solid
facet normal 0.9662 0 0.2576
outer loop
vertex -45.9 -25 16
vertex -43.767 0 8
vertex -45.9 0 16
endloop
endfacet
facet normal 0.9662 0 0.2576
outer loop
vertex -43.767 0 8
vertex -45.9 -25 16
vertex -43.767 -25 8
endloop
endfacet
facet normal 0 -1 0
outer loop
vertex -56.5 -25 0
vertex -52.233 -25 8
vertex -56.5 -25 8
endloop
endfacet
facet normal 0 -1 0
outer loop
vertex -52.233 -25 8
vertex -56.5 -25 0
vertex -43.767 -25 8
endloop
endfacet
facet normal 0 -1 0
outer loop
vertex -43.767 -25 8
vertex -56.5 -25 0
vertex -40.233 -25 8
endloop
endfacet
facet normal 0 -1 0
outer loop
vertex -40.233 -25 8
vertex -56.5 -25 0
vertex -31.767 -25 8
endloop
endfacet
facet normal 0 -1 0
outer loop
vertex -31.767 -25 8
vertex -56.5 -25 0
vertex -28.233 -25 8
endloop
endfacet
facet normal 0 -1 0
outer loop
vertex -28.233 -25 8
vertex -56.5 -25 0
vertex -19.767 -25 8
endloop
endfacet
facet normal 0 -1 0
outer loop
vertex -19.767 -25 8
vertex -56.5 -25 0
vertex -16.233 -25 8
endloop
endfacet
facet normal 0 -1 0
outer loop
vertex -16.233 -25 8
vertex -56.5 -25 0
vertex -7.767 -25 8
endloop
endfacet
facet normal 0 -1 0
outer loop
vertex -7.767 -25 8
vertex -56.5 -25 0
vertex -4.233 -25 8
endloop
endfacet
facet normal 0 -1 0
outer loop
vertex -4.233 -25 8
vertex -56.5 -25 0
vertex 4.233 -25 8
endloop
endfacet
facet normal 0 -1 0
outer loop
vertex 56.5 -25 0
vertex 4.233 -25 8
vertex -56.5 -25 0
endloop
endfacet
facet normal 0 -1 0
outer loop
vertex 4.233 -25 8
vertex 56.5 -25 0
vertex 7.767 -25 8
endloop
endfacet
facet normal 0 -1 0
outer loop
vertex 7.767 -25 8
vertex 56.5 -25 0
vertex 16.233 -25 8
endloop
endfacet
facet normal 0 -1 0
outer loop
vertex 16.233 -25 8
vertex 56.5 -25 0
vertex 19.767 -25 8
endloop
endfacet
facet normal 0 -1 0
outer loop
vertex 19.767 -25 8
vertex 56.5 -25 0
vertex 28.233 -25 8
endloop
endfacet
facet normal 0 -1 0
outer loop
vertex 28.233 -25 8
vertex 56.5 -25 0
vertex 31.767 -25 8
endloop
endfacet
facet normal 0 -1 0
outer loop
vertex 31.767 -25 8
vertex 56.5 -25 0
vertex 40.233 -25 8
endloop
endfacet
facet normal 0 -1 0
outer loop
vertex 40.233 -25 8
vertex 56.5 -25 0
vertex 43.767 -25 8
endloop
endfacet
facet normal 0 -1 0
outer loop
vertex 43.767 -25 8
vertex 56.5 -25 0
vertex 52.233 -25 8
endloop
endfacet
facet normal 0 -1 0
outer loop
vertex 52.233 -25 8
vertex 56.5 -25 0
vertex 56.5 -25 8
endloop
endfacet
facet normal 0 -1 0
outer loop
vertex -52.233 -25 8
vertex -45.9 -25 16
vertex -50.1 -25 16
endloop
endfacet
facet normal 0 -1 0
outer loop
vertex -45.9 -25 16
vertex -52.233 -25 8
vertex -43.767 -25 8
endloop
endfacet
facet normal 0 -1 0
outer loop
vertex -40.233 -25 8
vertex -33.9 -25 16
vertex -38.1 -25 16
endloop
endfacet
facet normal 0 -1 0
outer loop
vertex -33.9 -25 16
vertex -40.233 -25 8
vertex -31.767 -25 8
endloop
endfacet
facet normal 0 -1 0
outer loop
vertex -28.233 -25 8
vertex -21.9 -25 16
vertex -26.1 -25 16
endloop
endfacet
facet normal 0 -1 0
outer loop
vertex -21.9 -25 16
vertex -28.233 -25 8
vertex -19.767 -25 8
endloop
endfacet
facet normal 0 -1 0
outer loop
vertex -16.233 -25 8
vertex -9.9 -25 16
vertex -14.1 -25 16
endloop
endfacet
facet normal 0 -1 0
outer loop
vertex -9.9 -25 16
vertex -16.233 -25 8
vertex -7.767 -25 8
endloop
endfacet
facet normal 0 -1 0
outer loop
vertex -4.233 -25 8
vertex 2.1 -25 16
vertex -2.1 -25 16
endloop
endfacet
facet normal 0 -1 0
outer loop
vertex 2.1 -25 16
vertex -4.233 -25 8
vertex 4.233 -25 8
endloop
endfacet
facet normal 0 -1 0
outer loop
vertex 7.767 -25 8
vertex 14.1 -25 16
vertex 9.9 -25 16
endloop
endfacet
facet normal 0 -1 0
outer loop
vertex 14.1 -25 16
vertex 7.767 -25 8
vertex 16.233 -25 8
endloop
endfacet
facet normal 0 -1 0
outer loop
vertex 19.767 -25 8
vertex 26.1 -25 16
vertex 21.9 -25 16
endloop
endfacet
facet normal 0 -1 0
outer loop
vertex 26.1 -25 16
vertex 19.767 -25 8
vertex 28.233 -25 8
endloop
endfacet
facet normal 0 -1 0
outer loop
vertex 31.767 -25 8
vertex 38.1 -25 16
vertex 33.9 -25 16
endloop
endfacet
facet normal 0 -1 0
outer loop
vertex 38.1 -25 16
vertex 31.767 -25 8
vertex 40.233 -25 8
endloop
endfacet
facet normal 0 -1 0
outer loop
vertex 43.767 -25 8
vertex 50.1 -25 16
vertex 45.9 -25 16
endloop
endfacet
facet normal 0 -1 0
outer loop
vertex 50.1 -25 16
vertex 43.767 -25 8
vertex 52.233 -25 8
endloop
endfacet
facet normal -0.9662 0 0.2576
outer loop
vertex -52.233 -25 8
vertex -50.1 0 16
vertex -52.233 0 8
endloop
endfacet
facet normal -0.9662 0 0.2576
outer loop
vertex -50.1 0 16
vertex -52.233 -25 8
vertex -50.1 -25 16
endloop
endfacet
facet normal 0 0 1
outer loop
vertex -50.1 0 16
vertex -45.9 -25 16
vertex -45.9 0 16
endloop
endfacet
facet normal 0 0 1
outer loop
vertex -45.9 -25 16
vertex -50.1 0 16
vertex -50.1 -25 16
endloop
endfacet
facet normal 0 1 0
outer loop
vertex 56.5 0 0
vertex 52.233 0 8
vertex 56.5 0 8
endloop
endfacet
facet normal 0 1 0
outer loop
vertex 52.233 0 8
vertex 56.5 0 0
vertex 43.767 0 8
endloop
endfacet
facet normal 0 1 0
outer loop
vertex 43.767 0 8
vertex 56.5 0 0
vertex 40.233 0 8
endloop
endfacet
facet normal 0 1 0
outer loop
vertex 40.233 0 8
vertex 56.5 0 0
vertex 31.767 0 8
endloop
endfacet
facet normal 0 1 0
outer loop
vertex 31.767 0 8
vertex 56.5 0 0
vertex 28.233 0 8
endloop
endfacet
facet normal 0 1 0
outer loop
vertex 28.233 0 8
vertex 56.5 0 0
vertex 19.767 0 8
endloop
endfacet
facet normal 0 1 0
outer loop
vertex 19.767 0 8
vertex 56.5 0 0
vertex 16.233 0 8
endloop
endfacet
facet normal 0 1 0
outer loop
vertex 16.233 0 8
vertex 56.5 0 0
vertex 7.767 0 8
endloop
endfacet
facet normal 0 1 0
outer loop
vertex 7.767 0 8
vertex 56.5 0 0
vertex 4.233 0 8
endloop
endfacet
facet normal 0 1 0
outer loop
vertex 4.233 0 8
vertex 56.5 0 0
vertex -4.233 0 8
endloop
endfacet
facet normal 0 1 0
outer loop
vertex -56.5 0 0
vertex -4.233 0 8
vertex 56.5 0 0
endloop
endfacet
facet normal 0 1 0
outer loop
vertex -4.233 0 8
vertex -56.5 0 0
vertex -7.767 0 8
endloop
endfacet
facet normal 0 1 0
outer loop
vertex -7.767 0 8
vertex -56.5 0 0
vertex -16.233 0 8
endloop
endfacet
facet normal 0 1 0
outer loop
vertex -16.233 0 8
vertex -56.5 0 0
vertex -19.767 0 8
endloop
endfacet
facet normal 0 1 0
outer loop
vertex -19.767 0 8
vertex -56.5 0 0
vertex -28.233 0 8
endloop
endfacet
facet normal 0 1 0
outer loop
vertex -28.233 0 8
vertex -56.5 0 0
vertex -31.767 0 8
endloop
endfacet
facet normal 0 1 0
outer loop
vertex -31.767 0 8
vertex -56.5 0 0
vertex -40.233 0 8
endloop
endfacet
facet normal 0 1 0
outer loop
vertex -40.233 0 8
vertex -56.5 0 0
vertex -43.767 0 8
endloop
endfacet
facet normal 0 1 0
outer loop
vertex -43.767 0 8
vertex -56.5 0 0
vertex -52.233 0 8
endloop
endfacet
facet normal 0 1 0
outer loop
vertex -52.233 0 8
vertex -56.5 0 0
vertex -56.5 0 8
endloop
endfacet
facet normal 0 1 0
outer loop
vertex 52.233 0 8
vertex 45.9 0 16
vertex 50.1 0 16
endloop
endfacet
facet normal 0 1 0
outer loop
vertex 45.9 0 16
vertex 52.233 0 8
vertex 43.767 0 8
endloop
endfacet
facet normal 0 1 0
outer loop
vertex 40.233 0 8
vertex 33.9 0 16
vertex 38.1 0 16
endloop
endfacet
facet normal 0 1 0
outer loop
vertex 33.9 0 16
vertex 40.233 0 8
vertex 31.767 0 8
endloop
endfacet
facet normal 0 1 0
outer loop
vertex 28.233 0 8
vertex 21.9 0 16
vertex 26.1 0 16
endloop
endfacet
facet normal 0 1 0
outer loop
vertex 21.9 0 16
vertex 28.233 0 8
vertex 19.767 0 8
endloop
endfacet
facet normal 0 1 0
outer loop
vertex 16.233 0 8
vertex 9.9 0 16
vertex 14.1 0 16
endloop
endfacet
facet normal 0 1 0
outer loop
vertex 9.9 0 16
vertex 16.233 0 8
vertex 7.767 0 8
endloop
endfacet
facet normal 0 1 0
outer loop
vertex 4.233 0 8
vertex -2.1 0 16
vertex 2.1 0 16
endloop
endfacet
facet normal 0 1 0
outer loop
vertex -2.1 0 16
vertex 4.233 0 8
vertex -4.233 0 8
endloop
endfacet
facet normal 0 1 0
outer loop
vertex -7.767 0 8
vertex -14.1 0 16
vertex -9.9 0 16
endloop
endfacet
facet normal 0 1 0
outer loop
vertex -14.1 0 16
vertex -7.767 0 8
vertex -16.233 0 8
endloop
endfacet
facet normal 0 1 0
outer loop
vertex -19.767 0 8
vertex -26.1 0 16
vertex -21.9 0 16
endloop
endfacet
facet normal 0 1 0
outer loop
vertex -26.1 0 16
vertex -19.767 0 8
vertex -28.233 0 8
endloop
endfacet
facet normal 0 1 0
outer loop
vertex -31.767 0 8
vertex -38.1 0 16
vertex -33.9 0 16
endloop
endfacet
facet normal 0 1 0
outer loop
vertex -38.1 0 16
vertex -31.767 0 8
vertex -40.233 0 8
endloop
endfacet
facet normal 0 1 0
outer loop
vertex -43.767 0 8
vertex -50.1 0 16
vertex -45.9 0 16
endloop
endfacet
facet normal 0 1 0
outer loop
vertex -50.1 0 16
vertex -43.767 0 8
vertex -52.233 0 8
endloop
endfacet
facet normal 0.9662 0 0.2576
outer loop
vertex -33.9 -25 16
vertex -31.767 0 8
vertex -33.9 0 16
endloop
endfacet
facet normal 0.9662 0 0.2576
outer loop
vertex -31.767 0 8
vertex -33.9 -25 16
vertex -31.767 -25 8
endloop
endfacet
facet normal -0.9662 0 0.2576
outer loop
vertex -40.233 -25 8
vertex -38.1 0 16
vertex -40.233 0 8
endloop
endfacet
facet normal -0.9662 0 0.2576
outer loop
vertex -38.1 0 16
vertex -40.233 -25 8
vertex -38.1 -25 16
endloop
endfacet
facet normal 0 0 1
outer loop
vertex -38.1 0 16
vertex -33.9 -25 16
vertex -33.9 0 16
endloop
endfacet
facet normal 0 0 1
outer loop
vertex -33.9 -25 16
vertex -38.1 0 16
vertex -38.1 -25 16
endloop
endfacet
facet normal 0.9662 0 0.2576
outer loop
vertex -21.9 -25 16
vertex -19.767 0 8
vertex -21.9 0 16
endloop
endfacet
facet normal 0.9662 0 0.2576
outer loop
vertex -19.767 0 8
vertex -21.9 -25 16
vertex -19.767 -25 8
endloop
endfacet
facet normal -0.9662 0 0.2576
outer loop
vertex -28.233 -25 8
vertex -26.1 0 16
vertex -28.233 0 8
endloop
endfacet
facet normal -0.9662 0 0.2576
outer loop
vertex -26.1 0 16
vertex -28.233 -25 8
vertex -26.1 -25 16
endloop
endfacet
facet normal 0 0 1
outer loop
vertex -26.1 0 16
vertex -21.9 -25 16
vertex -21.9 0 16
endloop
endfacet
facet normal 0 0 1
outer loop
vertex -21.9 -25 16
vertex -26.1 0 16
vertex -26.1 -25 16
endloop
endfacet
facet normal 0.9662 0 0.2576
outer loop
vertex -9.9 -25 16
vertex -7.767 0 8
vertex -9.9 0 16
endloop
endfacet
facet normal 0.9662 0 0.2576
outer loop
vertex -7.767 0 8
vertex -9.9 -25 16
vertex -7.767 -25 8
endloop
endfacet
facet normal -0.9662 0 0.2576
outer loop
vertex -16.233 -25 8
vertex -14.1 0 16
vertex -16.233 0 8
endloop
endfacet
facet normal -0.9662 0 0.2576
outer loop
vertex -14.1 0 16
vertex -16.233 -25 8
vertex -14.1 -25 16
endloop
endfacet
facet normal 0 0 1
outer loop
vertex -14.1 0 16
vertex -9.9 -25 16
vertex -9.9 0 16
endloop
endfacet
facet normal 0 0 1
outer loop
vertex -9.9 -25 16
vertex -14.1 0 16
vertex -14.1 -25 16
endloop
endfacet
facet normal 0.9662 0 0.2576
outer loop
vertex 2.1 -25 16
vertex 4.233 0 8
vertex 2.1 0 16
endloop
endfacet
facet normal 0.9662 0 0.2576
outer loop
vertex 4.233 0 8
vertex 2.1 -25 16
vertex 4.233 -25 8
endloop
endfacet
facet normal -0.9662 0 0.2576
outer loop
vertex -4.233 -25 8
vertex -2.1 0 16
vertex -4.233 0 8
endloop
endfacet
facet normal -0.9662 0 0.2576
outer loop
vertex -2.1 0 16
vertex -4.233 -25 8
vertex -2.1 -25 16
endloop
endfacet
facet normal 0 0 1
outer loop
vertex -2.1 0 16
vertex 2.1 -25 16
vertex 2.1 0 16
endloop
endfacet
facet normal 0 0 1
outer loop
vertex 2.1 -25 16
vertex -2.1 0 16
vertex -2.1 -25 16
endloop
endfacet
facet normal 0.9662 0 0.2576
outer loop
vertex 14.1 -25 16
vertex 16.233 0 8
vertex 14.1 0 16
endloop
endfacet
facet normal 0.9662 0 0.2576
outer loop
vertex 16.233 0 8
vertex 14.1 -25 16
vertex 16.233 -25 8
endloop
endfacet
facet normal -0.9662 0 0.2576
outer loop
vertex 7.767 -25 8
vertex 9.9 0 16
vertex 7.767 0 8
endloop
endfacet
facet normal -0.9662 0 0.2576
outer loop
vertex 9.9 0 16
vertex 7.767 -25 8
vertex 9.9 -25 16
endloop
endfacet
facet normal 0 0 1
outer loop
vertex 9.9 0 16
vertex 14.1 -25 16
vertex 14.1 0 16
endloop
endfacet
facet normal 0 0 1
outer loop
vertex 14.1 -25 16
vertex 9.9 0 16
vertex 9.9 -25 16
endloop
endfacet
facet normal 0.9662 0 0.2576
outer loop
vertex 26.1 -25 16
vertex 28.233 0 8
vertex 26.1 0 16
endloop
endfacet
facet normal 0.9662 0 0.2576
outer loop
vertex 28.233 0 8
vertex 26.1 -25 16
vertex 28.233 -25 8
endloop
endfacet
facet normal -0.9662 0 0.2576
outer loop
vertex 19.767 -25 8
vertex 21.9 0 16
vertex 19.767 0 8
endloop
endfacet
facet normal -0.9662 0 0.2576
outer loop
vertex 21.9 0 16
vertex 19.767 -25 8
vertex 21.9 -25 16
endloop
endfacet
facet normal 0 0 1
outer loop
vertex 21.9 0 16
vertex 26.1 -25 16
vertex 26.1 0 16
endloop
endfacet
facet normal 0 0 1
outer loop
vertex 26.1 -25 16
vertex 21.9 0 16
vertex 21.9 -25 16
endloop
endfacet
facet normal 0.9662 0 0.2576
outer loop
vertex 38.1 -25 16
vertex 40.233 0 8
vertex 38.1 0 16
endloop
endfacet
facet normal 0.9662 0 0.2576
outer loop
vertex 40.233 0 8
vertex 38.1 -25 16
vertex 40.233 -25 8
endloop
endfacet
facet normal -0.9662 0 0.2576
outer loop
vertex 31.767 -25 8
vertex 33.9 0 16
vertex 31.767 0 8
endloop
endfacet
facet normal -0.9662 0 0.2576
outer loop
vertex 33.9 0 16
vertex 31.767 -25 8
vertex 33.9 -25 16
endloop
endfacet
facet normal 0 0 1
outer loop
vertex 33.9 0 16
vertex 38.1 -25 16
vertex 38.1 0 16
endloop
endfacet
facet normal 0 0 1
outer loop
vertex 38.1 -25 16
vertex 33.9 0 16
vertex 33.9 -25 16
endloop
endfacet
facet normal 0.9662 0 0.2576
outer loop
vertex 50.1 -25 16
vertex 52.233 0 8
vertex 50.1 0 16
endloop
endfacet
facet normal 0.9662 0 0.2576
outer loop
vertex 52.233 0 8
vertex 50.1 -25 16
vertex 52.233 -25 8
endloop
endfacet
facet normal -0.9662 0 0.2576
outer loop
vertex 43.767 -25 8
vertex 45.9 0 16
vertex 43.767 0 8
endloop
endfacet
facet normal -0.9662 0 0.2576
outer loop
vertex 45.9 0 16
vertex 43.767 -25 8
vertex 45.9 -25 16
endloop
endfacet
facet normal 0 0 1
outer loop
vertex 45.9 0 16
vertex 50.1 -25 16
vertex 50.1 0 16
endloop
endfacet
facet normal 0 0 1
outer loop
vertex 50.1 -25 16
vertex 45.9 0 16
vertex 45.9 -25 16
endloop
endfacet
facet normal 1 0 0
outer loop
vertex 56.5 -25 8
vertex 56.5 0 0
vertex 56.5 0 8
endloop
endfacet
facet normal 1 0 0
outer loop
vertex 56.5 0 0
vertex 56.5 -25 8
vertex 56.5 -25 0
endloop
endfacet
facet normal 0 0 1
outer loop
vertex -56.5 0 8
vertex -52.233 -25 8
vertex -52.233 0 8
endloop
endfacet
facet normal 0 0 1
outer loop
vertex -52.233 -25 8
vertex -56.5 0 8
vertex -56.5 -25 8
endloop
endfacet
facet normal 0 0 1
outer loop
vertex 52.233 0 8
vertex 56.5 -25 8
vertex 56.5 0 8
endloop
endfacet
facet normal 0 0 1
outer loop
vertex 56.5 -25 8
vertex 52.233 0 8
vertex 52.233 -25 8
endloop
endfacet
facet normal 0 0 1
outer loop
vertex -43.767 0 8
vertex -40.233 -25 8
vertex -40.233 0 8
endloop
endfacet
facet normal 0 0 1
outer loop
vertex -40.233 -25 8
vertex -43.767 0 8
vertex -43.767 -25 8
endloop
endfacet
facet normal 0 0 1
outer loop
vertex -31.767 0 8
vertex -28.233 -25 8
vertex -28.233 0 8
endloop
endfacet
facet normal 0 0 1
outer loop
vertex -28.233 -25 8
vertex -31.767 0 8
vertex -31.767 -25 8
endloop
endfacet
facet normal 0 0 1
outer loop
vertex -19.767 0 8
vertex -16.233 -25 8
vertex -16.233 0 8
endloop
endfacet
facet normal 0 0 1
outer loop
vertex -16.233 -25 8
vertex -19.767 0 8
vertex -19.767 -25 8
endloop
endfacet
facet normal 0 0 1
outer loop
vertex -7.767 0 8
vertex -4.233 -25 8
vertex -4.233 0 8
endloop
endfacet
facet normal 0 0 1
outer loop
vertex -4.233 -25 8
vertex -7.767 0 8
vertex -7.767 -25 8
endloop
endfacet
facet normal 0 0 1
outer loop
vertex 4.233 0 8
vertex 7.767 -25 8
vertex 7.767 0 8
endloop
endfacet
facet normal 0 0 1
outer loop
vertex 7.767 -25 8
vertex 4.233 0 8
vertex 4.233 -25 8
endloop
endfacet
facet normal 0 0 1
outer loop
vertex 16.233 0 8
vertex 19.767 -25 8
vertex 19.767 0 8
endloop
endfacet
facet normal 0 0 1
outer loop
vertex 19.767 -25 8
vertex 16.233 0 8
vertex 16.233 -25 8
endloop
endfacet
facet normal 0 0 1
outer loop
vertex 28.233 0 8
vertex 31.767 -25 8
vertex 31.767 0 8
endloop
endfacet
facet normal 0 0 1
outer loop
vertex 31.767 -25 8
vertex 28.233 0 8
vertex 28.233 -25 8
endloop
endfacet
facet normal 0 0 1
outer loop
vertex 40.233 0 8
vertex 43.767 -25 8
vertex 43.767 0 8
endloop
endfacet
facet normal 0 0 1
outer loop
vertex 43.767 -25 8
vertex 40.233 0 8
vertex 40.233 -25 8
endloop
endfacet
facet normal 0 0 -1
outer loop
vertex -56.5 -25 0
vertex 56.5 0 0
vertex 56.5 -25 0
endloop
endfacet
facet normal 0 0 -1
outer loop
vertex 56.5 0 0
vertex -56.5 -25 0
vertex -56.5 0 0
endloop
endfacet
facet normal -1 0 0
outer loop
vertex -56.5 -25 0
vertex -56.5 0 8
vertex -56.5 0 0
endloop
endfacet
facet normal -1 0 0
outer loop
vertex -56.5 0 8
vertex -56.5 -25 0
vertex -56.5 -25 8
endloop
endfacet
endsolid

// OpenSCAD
$fn = 32;

// ----------------------------------------------------------------------
// Toothed rack, 9 teeth
// 12 mm pitch, 8 mm teeth
// ----------------------------------------------------------------------

// --- parameters (mm) ---
bar_w = 25;      // bar width (Y)
seat_tol = 0.1;  // tolerance at the seating features
free_tol = 0.3;  // general tolerance on the free sizes
bar_h = 8;       // bar height (Z)
teeth = 9;       // number of teeth
pitch = 12;      // tooth pitch
tooth_h = 8;     // tooth height above the bar
root_w = 9;      // tooth width at the root
crest_w = 4.2;   // tooth width at the crest

// --- derived feature positions (mm) ---
span = (teeth - 1) * pitch;  // = 96   distance between the outer teeth
bar_l = span + root_w + 8;   // = 113   bar length: teeth plus 4 mm at each end
tooth_x = -span / 2;         // = -48   X of the first tooth
height = bar_h + tooth_h;    // = 16   overall height
feature_centers = [
  [tooth_x + 0 * pitch, -bar_w / 2],
  [tooth_x + 1 * pitch, -bar_w / 2],
  [tooth_x + 2 * pitch, -bar_w / 2],
  [tooth_x + 3 * pitch, -bar_w / 2],
  [tooth_x + 4 * pitch, -bar_w / 2],
  [tooth_x + 5 * pitch, -bar_w / 2],
  [tooth_x + 6 * pitch, -bar_w / 2],
  [tooth_x + 7 * pitch, -bar_w / 2],
  [tooth_x + 8 * pitch, -bar_w / 2]
];   // tooth centre line, drives the tooth loop

// bar with a rack of teeth, one extruded trapezoium per centre
module rack_tooth() {
  linear_extrude(height = bar_w)
    polygon(points = [
      [0, 0],
      [root_w, 0],
      [root_w / 2 + crest_w / 2, tooth_h + 1],
      [root_w / 2 - crest_w / 2, tooth_h + 1]
    ]);
}

union() {
  translate([-bar_l / 2, -bar_w, 0]) cube([bar_l, bar_w, bar_h]);
  for (centre = feature_centers)
    translate([centre[0] - root_w / 2, 0, bar_h - 1]) rotate([90, 0, 0]) rack_tooth();
}
